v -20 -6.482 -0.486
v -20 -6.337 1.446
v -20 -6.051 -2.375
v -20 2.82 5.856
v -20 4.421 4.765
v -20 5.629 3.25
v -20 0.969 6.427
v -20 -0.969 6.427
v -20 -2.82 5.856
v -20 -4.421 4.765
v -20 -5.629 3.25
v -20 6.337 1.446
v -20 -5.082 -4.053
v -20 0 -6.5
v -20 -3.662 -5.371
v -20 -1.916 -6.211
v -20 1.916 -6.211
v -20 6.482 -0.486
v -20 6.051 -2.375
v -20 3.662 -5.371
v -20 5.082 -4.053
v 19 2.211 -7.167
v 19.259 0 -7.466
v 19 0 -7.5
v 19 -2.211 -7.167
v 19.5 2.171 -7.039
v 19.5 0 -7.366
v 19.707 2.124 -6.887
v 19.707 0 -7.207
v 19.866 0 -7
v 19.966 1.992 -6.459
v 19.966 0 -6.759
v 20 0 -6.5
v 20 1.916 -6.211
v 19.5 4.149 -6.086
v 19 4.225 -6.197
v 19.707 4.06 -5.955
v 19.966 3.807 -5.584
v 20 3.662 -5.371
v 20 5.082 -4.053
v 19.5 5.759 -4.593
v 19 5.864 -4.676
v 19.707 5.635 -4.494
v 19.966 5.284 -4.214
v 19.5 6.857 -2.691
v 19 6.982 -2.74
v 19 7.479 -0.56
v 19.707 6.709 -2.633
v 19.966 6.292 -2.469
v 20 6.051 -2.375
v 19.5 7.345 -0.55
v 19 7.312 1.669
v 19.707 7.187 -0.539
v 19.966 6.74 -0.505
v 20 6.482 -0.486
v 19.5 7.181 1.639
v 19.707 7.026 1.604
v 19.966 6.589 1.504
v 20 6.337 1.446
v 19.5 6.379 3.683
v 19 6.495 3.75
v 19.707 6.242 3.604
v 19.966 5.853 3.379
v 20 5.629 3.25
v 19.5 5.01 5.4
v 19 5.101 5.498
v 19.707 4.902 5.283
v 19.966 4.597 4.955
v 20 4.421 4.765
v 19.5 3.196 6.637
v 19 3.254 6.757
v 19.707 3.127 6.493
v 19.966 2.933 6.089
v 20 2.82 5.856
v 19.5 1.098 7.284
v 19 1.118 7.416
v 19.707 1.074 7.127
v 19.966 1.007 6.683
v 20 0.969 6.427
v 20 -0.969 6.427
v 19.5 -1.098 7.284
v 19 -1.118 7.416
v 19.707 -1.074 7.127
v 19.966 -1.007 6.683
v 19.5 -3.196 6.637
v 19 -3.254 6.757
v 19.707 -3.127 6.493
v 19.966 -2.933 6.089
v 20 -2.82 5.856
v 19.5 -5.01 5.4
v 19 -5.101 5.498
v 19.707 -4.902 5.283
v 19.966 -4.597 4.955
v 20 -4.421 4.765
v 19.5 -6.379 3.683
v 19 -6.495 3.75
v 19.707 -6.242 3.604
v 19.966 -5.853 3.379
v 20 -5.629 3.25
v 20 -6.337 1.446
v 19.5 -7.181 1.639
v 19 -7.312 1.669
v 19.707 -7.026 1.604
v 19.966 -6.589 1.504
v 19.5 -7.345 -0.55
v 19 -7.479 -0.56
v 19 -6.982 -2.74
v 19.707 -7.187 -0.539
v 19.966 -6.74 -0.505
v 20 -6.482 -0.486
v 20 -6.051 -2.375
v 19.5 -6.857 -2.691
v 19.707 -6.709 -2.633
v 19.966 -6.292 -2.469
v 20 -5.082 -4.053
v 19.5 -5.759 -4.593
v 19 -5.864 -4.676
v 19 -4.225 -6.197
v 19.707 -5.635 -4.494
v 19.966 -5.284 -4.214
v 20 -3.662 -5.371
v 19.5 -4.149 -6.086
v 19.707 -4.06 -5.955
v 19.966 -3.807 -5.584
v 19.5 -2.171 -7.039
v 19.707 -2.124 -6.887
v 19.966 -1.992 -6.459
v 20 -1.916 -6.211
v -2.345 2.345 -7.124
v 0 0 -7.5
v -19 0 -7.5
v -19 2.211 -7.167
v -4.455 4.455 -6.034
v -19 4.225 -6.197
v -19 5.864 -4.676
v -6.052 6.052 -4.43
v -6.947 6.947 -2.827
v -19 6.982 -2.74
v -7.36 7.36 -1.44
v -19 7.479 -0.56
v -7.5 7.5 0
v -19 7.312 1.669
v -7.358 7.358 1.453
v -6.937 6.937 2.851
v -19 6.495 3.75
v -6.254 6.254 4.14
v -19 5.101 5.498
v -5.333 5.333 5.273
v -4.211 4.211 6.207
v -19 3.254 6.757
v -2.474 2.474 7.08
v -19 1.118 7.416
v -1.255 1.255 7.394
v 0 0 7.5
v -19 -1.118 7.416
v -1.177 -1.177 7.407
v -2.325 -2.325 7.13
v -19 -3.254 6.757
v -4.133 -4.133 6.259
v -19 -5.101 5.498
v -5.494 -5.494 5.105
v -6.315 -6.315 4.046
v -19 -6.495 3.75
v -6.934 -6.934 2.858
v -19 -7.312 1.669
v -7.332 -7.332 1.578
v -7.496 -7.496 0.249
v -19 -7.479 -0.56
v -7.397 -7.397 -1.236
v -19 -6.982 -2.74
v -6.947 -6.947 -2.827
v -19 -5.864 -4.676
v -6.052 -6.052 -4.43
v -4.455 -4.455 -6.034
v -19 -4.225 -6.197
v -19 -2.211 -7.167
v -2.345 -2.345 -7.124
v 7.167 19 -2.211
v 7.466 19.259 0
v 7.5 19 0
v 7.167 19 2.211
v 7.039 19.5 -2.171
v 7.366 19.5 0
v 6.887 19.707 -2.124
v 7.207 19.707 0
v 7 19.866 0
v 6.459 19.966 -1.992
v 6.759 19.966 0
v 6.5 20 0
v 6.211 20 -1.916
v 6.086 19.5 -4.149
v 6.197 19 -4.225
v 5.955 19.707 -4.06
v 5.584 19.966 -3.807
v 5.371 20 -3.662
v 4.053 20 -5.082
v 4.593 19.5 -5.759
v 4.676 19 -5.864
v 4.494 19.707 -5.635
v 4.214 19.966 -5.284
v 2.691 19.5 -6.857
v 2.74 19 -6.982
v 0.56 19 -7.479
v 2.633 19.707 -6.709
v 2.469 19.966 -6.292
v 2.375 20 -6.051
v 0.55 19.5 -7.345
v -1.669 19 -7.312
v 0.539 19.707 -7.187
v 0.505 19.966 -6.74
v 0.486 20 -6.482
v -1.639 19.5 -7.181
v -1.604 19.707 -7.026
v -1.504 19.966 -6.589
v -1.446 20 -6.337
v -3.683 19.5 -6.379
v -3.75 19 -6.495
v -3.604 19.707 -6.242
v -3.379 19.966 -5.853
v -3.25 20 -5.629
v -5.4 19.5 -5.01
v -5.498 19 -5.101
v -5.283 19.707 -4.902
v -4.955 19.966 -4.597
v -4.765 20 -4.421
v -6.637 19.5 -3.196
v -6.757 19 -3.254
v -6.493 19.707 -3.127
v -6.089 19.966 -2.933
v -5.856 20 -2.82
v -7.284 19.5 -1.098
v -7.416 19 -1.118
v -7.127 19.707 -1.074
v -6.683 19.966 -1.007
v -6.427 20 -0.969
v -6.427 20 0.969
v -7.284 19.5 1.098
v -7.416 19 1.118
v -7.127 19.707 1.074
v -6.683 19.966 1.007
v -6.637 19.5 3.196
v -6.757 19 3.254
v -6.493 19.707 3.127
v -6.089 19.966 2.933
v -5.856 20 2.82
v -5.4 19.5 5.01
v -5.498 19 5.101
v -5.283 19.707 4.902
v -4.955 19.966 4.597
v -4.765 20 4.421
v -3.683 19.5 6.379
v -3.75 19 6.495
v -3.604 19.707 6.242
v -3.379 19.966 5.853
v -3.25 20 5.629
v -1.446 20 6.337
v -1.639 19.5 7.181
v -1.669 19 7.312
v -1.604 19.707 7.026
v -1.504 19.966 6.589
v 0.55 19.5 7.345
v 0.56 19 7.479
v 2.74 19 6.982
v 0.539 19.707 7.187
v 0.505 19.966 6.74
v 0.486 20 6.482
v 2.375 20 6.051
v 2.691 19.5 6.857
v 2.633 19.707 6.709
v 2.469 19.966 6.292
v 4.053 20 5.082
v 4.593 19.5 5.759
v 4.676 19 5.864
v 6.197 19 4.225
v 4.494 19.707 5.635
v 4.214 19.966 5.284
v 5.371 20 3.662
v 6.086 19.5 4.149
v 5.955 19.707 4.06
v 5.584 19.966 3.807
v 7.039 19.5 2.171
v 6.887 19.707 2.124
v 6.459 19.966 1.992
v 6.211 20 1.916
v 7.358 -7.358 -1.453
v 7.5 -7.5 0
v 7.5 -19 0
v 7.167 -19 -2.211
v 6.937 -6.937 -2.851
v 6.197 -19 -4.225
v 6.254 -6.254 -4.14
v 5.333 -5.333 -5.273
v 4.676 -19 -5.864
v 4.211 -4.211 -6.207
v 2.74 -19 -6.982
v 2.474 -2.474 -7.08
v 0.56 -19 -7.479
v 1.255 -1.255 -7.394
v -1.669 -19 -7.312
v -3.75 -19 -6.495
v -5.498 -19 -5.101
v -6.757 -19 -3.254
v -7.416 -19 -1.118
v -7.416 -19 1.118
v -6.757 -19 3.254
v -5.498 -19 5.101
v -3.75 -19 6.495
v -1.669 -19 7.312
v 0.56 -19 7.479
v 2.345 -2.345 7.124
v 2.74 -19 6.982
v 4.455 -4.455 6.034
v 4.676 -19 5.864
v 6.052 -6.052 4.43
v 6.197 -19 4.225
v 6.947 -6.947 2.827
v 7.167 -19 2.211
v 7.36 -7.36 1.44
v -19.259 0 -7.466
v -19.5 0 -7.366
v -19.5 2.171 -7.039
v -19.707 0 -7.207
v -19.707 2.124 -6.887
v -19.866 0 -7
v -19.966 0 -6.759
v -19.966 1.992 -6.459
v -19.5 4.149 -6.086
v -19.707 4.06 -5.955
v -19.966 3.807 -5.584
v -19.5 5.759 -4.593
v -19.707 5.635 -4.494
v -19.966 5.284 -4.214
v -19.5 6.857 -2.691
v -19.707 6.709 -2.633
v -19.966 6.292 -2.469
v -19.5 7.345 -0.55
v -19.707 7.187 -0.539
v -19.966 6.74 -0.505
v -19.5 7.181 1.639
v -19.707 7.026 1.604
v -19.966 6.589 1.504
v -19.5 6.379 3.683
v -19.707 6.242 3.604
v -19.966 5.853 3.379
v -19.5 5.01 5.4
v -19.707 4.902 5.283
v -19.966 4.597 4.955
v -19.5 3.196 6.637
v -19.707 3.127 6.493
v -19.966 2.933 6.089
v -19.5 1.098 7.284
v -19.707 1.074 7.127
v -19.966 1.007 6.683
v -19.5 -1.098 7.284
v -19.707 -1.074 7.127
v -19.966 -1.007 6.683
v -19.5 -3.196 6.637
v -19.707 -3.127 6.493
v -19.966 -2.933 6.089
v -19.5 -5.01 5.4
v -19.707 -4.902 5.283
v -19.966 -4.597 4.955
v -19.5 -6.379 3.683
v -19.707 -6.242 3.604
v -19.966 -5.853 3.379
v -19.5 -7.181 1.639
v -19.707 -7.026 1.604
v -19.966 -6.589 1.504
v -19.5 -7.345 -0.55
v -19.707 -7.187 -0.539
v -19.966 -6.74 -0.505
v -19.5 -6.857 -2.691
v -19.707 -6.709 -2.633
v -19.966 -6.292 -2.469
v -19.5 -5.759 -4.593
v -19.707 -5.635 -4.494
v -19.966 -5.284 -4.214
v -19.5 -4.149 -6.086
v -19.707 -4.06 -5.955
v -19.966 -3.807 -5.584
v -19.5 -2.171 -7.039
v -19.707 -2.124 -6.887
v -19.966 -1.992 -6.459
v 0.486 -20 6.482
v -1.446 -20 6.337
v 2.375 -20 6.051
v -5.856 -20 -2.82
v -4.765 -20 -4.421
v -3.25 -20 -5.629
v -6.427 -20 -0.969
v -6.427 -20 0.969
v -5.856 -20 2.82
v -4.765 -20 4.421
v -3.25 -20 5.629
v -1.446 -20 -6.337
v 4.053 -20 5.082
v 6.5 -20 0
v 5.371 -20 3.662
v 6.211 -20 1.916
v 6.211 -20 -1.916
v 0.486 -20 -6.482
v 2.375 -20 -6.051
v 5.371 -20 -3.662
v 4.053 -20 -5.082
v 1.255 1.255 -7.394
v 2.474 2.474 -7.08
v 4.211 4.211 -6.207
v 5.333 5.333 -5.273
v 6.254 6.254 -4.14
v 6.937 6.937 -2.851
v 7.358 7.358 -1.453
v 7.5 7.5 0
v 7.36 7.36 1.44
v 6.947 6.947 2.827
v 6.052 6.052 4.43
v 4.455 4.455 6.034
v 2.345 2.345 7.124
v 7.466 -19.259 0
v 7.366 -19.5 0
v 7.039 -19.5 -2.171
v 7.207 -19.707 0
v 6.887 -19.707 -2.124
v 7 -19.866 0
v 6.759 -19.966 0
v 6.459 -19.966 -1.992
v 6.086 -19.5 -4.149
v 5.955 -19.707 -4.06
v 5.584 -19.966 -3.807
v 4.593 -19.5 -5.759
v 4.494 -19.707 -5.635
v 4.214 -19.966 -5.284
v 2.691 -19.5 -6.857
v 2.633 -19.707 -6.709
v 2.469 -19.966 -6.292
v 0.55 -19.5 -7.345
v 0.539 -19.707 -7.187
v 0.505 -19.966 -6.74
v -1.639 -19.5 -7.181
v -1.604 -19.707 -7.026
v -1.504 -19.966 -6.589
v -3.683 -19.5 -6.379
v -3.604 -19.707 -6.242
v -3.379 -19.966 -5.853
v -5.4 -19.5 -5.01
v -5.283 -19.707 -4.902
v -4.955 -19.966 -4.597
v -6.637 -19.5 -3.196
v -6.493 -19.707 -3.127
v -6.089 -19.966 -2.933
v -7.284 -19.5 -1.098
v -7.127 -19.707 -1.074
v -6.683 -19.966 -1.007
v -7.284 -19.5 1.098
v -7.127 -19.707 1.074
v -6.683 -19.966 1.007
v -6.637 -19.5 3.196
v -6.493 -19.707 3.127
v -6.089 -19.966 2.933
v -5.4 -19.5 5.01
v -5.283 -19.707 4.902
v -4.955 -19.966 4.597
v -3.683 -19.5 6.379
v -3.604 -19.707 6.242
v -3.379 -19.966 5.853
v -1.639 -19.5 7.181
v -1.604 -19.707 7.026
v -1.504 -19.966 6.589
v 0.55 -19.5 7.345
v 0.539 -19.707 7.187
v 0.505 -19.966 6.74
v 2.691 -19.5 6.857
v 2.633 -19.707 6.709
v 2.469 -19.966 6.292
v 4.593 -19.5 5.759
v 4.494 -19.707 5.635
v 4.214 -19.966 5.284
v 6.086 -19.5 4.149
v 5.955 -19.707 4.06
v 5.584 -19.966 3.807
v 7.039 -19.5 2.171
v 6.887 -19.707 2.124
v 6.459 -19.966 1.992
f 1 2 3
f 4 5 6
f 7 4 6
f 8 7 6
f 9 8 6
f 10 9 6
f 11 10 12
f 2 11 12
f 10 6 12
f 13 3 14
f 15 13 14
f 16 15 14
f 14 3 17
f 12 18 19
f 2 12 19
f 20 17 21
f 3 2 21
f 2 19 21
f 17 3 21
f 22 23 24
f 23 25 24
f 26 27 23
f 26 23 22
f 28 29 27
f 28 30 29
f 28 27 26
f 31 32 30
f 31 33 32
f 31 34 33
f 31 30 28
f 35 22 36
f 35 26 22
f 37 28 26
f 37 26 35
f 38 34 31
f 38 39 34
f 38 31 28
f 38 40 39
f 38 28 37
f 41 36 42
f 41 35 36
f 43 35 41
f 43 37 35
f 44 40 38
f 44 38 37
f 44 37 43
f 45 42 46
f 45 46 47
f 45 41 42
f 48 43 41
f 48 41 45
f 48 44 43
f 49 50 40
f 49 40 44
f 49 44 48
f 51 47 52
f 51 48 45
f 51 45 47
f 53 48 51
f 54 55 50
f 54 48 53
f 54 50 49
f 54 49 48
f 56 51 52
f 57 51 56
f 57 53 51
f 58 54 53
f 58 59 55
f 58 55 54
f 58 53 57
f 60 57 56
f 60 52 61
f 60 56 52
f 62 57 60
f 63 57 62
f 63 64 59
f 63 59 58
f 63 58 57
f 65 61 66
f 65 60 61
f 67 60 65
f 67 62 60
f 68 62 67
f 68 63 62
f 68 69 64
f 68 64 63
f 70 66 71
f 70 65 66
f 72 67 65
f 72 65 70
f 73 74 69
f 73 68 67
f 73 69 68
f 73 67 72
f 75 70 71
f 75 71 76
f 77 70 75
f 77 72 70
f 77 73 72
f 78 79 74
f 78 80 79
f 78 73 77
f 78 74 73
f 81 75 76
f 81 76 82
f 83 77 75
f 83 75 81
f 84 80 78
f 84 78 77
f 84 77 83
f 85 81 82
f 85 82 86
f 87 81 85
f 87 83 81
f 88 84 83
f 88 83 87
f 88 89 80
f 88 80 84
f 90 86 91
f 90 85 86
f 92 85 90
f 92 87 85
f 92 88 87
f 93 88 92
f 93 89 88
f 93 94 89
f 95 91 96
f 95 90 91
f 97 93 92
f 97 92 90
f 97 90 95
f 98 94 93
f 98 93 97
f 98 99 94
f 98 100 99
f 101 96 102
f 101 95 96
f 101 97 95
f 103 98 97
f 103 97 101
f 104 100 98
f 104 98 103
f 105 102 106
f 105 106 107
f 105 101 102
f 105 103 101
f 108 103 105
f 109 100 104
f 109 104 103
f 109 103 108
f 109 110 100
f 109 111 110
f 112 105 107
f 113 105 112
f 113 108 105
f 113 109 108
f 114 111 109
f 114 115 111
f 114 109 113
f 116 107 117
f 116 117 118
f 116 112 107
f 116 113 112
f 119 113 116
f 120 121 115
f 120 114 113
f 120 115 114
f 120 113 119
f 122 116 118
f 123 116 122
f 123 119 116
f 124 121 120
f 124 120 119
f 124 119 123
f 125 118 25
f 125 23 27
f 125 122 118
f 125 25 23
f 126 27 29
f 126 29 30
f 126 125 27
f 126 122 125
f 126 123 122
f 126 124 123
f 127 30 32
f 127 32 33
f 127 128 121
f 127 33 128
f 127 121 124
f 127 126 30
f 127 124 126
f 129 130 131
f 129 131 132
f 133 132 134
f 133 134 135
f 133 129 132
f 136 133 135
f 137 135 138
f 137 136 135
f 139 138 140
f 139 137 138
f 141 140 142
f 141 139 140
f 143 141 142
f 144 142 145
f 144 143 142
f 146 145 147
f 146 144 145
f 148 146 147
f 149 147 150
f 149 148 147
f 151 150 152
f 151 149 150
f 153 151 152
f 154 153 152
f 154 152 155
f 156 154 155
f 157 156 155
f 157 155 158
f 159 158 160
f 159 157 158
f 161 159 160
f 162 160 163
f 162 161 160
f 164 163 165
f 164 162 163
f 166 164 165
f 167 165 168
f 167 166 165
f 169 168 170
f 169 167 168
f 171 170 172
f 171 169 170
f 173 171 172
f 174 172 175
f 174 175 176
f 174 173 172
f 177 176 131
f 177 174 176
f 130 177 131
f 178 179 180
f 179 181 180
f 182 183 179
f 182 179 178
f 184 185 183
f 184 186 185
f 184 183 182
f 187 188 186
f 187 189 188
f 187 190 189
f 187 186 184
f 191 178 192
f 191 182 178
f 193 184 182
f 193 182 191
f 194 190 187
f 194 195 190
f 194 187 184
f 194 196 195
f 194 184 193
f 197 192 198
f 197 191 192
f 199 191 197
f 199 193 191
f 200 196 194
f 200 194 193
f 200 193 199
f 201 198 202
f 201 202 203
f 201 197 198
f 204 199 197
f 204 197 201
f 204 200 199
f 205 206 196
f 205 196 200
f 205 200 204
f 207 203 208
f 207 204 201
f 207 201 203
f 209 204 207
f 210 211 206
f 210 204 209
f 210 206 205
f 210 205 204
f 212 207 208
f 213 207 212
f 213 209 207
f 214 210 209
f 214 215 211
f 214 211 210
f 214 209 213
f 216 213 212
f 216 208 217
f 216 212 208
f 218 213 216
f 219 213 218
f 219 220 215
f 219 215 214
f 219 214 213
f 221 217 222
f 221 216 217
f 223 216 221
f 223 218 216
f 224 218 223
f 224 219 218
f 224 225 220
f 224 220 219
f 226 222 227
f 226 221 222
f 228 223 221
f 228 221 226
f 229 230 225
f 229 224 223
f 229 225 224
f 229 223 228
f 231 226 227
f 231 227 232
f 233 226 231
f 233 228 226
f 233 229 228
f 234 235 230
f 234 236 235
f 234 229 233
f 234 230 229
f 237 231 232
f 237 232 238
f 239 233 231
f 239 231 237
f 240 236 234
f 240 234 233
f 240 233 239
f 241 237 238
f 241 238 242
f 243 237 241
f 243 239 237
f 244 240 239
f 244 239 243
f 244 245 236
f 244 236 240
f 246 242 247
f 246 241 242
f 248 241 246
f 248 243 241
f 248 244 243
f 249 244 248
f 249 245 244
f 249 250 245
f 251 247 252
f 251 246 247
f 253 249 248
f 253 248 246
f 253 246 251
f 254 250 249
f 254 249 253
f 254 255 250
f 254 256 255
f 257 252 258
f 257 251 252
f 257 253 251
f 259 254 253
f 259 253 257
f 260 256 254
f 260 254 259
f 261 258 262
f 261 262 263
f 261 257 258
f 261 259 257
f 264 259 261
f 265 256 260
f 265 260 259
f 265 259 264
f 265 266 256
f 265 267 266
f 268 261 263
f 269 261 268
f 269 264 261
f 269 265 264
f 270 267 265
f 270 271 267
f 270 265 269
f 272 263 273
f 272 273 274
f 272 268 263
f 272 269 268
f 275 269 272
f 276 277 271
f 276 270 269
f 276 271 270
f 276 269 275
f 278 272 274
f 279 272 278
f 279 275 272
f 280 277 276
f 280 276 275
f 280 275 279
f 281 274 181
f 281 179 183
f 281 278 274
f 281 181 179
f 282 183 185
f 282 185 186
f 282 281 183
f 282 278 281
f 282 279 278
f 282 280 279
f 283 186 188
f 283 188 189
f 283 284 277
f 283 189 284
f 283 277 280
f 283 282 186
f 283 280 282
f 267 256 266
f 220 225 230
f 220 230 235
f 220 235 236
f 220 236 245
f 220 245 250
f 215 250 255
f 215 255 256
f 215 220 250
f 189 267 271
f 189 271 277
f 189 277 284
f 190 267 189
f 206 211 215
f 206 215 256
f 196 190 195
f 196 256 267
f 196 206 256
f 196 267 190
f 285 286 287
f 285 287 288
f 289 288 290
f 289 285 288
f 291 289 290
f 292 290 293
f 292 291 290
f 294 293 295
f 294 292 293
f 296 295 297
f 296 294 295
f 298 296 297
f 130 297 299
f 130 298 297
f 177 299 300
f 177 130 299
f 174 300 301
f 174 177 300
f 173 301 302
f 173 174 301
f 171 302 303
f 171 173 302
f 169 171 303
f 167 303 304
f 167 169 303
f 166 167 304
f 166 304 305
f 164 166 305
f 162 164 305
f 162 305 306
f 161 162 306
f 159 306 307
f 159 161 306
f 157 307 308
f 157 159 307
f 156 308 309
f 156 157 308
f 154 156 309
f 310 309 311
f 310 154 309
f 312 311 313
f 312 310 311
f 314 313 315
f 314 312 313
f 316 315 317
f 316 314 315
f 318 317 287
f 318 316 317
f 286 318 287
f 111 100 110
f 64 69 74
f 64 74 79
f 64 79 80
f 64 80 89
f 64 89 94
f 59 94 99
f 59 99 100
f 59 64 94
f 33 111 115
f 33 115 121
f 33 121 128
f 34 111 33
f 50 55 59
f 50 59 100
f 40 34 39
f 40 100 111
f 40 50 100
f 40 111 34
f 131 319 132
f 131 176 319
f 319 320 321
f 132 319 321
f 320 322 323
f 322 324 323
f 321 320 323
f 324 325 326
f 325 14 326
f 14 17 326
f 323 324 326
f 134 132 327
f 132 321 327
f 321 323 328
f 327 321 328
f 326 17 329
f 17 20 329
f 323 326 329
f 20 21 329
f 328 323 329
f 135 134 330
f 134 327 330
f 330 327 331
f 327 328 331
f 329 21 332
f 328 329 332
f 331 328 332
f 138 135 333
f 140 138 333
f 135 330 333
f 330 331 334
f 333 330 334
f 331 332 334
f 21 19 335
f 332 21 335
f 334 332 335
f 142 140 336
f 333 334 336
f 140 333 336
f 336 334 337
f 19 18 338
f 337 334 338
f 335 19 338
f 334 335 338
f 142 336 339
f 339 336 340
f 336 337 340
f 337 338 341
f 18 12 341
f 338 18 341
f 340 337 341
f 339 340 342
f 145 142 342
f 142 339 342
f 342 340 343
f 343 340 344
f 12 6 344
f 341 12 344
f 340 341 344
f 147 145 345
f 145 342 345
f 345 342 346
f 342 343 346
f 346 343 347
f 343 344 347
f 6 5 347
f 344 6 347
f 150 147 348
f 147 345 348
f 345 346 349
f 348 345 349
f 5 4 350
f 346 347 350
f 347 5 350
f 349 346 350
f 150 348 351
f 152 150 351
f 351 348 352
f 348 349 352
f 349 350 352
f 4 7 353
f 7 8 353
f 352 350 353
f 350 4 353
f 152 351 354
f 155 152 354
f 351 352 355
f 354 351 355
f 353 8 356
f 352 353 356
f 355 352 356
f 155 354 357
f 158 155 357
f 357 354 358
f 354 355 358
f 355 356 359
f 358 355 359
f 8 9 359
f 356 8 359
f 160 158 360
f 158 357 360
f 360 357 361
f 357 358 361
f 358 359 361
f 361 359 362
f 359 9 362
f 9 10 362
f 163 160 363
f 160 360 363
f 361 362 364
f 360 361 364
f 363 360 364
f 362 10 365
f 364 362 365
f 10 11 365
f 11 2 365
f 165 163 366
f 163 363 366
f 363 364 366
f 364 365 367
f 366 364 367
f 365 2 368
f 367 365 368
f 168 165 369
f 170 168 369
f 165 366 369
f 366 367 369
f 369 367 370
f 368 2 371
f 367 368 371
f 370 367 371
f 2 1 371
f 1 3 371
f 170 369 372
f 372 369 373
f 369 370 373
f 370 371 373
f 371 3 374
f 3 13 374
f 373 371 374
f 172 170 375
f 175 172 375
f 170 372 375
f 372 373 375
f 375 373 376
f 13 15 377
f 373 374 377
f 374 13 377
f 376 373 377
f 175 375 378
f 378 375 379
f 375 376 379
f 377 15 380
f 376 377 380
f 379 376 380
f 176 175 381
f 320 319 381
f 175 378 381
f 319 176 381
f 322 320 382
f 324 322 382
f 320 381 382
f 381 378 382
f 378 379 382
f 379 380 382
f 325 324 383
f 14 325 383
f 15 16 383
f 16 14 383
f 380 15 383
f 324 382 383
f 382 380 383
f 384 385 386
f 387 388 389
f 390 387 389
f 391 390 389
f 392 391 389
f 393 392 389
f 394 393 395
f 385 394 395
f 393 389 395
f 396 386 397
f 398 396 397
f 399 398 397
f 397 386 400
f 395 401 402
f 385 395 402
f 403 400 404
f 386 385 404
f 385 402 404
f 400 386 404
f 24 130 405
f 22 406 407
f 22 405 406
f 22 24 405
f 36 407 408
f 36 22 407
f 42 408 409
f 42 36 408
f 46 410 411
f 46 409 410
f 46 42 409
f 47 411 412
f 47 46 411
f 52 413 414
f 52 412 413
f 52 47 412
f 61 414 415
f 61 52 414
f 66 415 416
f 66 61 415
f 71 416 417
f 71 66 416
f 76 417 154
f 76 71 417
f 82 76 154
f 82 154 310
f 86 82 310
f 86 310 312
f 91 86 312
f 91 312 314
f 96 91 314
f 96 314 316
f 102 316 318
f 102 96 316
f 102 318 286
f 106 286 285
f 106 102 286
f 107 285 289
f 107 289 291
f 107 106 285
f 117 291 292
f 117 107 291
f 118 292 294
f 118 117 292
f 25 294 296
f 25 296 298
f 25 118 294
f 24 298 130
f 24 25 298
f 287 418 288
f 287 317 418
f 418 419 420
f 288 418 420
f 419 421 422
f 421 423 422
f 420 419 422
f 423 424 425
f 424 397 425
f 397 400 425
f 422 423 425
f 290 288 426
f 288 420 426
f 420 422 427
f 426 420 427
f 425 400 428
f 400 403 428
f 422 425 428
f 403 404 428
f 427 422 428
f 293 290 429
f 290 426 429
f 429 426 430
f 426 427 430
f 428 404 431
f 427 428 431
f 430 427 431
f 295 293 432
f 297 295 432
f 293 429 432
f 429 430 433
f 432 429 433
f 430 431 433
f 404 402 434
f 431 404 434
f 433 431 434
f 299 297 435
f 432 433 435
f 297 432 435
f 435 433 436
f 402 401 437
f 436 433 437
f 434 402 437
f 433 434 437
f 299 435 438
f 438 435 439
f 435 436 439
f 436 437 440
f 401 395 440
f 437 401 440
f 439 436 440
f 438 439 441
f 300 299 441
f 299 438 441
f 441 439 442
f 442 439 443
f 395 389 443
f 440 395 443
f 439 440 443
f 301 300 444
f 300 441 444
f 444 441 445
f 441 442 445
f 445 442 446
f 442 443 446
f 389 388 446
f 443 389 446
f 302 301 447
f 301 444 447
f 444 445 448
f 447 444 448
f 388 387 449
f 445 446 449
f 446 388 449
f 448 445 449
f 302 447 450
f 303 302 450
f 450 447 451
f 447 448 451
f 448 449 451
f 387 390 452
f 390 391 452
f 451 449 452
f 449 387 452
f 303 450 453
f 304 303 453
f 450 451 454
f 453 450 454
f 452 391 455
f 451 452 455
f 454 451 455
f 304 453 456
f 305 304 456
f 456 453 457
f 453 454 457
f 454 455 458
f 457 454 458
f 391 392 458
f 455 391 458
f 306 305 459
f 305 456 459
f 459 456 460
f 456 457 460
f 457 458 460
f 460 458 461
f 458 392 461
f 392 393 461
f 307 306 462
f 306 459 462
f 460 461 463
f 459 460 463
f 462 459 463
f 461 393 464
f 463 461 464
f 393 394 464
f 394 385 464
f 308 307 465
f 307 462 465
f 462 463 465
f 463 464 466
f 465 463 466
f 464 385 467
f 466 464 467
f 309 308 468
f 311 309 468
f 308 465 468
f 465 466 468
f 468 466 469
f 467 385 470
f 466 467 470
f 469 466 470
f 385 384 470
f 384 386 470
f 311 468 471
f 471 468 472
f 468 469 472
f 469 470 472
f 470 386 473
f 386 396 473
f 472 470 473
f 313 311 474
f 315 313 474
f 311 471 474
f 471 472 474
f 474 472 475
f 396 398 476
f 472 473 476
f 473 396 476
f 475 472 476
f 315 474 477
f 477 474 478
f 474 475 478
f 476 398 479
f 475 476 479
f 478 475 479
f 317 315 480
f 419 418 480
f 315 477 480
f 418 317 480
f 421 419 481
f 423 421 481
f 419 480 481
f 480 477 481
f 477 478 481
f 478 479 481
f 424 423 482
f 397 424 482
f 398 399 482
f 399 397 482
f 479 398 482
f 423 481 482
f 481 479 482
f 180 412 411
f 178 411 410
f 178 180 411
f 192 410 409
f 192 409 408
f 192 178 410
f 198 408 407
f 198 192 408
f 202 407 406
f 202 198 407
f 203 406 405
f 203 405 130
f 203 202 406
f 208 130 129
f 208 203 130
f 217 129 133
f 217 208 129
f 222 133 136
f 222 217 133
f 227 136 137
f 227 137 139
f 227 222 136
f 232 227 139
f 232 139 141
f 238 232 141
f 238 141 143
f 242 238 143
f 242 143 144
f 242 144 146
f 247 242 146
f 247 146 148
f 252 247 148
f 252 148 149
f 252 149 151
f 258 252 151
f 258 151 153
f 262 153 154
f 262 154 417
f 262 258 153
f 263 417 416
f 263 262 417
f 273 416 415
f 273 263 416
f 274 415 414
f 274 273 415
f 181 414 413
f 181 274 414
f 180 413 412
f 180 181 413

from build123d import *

# Parameters (mm, degrees)
SKETCH1_R           = 7.5
BOSS_EXTRUDE1_DEPTH = 20
SKETCH2_R           = 7.5
BOSS_EXTRUDE2_DEPTH = 20
FILLET1_R           = 1


with BuildPart() as part:
    # Sketch1 → Boss-Extrude1 (new body, symmetric)
    with BuildSketch(Plane(origin=(0, 0, 0), x_dir=(1, 0, 0), z_dir=(0, 1, 0))):
        Circle(SKETCH1_R)
    extrude(amount=BOSS_EXTRUDE1_DEPTH, both=True)

    # Sketch2 → Boss-Extrude2 (add, symmetric)
    with BuildSketch(Plane(origin=(0, 0, 0), x_dir=(0, 0, -1), z_dir=(1, 0, 0))):
        Circle(SKETCH2_R)
    extrude(amount=BOSS_EXTRUDE2_DEPTH, both=True)

    # Fillet1
    fillet1_edges = [part.edges().sort_by_distance(p)[0] for p in [
        (-7.5, -20, 0),
        (-7.5, 20, 0),
        (-20, 0, 7.5),
        (20, 0, 7.5),
    ]]
    fillet(fillet1_edges, radius=FILLET1_R)


solid = part.part
